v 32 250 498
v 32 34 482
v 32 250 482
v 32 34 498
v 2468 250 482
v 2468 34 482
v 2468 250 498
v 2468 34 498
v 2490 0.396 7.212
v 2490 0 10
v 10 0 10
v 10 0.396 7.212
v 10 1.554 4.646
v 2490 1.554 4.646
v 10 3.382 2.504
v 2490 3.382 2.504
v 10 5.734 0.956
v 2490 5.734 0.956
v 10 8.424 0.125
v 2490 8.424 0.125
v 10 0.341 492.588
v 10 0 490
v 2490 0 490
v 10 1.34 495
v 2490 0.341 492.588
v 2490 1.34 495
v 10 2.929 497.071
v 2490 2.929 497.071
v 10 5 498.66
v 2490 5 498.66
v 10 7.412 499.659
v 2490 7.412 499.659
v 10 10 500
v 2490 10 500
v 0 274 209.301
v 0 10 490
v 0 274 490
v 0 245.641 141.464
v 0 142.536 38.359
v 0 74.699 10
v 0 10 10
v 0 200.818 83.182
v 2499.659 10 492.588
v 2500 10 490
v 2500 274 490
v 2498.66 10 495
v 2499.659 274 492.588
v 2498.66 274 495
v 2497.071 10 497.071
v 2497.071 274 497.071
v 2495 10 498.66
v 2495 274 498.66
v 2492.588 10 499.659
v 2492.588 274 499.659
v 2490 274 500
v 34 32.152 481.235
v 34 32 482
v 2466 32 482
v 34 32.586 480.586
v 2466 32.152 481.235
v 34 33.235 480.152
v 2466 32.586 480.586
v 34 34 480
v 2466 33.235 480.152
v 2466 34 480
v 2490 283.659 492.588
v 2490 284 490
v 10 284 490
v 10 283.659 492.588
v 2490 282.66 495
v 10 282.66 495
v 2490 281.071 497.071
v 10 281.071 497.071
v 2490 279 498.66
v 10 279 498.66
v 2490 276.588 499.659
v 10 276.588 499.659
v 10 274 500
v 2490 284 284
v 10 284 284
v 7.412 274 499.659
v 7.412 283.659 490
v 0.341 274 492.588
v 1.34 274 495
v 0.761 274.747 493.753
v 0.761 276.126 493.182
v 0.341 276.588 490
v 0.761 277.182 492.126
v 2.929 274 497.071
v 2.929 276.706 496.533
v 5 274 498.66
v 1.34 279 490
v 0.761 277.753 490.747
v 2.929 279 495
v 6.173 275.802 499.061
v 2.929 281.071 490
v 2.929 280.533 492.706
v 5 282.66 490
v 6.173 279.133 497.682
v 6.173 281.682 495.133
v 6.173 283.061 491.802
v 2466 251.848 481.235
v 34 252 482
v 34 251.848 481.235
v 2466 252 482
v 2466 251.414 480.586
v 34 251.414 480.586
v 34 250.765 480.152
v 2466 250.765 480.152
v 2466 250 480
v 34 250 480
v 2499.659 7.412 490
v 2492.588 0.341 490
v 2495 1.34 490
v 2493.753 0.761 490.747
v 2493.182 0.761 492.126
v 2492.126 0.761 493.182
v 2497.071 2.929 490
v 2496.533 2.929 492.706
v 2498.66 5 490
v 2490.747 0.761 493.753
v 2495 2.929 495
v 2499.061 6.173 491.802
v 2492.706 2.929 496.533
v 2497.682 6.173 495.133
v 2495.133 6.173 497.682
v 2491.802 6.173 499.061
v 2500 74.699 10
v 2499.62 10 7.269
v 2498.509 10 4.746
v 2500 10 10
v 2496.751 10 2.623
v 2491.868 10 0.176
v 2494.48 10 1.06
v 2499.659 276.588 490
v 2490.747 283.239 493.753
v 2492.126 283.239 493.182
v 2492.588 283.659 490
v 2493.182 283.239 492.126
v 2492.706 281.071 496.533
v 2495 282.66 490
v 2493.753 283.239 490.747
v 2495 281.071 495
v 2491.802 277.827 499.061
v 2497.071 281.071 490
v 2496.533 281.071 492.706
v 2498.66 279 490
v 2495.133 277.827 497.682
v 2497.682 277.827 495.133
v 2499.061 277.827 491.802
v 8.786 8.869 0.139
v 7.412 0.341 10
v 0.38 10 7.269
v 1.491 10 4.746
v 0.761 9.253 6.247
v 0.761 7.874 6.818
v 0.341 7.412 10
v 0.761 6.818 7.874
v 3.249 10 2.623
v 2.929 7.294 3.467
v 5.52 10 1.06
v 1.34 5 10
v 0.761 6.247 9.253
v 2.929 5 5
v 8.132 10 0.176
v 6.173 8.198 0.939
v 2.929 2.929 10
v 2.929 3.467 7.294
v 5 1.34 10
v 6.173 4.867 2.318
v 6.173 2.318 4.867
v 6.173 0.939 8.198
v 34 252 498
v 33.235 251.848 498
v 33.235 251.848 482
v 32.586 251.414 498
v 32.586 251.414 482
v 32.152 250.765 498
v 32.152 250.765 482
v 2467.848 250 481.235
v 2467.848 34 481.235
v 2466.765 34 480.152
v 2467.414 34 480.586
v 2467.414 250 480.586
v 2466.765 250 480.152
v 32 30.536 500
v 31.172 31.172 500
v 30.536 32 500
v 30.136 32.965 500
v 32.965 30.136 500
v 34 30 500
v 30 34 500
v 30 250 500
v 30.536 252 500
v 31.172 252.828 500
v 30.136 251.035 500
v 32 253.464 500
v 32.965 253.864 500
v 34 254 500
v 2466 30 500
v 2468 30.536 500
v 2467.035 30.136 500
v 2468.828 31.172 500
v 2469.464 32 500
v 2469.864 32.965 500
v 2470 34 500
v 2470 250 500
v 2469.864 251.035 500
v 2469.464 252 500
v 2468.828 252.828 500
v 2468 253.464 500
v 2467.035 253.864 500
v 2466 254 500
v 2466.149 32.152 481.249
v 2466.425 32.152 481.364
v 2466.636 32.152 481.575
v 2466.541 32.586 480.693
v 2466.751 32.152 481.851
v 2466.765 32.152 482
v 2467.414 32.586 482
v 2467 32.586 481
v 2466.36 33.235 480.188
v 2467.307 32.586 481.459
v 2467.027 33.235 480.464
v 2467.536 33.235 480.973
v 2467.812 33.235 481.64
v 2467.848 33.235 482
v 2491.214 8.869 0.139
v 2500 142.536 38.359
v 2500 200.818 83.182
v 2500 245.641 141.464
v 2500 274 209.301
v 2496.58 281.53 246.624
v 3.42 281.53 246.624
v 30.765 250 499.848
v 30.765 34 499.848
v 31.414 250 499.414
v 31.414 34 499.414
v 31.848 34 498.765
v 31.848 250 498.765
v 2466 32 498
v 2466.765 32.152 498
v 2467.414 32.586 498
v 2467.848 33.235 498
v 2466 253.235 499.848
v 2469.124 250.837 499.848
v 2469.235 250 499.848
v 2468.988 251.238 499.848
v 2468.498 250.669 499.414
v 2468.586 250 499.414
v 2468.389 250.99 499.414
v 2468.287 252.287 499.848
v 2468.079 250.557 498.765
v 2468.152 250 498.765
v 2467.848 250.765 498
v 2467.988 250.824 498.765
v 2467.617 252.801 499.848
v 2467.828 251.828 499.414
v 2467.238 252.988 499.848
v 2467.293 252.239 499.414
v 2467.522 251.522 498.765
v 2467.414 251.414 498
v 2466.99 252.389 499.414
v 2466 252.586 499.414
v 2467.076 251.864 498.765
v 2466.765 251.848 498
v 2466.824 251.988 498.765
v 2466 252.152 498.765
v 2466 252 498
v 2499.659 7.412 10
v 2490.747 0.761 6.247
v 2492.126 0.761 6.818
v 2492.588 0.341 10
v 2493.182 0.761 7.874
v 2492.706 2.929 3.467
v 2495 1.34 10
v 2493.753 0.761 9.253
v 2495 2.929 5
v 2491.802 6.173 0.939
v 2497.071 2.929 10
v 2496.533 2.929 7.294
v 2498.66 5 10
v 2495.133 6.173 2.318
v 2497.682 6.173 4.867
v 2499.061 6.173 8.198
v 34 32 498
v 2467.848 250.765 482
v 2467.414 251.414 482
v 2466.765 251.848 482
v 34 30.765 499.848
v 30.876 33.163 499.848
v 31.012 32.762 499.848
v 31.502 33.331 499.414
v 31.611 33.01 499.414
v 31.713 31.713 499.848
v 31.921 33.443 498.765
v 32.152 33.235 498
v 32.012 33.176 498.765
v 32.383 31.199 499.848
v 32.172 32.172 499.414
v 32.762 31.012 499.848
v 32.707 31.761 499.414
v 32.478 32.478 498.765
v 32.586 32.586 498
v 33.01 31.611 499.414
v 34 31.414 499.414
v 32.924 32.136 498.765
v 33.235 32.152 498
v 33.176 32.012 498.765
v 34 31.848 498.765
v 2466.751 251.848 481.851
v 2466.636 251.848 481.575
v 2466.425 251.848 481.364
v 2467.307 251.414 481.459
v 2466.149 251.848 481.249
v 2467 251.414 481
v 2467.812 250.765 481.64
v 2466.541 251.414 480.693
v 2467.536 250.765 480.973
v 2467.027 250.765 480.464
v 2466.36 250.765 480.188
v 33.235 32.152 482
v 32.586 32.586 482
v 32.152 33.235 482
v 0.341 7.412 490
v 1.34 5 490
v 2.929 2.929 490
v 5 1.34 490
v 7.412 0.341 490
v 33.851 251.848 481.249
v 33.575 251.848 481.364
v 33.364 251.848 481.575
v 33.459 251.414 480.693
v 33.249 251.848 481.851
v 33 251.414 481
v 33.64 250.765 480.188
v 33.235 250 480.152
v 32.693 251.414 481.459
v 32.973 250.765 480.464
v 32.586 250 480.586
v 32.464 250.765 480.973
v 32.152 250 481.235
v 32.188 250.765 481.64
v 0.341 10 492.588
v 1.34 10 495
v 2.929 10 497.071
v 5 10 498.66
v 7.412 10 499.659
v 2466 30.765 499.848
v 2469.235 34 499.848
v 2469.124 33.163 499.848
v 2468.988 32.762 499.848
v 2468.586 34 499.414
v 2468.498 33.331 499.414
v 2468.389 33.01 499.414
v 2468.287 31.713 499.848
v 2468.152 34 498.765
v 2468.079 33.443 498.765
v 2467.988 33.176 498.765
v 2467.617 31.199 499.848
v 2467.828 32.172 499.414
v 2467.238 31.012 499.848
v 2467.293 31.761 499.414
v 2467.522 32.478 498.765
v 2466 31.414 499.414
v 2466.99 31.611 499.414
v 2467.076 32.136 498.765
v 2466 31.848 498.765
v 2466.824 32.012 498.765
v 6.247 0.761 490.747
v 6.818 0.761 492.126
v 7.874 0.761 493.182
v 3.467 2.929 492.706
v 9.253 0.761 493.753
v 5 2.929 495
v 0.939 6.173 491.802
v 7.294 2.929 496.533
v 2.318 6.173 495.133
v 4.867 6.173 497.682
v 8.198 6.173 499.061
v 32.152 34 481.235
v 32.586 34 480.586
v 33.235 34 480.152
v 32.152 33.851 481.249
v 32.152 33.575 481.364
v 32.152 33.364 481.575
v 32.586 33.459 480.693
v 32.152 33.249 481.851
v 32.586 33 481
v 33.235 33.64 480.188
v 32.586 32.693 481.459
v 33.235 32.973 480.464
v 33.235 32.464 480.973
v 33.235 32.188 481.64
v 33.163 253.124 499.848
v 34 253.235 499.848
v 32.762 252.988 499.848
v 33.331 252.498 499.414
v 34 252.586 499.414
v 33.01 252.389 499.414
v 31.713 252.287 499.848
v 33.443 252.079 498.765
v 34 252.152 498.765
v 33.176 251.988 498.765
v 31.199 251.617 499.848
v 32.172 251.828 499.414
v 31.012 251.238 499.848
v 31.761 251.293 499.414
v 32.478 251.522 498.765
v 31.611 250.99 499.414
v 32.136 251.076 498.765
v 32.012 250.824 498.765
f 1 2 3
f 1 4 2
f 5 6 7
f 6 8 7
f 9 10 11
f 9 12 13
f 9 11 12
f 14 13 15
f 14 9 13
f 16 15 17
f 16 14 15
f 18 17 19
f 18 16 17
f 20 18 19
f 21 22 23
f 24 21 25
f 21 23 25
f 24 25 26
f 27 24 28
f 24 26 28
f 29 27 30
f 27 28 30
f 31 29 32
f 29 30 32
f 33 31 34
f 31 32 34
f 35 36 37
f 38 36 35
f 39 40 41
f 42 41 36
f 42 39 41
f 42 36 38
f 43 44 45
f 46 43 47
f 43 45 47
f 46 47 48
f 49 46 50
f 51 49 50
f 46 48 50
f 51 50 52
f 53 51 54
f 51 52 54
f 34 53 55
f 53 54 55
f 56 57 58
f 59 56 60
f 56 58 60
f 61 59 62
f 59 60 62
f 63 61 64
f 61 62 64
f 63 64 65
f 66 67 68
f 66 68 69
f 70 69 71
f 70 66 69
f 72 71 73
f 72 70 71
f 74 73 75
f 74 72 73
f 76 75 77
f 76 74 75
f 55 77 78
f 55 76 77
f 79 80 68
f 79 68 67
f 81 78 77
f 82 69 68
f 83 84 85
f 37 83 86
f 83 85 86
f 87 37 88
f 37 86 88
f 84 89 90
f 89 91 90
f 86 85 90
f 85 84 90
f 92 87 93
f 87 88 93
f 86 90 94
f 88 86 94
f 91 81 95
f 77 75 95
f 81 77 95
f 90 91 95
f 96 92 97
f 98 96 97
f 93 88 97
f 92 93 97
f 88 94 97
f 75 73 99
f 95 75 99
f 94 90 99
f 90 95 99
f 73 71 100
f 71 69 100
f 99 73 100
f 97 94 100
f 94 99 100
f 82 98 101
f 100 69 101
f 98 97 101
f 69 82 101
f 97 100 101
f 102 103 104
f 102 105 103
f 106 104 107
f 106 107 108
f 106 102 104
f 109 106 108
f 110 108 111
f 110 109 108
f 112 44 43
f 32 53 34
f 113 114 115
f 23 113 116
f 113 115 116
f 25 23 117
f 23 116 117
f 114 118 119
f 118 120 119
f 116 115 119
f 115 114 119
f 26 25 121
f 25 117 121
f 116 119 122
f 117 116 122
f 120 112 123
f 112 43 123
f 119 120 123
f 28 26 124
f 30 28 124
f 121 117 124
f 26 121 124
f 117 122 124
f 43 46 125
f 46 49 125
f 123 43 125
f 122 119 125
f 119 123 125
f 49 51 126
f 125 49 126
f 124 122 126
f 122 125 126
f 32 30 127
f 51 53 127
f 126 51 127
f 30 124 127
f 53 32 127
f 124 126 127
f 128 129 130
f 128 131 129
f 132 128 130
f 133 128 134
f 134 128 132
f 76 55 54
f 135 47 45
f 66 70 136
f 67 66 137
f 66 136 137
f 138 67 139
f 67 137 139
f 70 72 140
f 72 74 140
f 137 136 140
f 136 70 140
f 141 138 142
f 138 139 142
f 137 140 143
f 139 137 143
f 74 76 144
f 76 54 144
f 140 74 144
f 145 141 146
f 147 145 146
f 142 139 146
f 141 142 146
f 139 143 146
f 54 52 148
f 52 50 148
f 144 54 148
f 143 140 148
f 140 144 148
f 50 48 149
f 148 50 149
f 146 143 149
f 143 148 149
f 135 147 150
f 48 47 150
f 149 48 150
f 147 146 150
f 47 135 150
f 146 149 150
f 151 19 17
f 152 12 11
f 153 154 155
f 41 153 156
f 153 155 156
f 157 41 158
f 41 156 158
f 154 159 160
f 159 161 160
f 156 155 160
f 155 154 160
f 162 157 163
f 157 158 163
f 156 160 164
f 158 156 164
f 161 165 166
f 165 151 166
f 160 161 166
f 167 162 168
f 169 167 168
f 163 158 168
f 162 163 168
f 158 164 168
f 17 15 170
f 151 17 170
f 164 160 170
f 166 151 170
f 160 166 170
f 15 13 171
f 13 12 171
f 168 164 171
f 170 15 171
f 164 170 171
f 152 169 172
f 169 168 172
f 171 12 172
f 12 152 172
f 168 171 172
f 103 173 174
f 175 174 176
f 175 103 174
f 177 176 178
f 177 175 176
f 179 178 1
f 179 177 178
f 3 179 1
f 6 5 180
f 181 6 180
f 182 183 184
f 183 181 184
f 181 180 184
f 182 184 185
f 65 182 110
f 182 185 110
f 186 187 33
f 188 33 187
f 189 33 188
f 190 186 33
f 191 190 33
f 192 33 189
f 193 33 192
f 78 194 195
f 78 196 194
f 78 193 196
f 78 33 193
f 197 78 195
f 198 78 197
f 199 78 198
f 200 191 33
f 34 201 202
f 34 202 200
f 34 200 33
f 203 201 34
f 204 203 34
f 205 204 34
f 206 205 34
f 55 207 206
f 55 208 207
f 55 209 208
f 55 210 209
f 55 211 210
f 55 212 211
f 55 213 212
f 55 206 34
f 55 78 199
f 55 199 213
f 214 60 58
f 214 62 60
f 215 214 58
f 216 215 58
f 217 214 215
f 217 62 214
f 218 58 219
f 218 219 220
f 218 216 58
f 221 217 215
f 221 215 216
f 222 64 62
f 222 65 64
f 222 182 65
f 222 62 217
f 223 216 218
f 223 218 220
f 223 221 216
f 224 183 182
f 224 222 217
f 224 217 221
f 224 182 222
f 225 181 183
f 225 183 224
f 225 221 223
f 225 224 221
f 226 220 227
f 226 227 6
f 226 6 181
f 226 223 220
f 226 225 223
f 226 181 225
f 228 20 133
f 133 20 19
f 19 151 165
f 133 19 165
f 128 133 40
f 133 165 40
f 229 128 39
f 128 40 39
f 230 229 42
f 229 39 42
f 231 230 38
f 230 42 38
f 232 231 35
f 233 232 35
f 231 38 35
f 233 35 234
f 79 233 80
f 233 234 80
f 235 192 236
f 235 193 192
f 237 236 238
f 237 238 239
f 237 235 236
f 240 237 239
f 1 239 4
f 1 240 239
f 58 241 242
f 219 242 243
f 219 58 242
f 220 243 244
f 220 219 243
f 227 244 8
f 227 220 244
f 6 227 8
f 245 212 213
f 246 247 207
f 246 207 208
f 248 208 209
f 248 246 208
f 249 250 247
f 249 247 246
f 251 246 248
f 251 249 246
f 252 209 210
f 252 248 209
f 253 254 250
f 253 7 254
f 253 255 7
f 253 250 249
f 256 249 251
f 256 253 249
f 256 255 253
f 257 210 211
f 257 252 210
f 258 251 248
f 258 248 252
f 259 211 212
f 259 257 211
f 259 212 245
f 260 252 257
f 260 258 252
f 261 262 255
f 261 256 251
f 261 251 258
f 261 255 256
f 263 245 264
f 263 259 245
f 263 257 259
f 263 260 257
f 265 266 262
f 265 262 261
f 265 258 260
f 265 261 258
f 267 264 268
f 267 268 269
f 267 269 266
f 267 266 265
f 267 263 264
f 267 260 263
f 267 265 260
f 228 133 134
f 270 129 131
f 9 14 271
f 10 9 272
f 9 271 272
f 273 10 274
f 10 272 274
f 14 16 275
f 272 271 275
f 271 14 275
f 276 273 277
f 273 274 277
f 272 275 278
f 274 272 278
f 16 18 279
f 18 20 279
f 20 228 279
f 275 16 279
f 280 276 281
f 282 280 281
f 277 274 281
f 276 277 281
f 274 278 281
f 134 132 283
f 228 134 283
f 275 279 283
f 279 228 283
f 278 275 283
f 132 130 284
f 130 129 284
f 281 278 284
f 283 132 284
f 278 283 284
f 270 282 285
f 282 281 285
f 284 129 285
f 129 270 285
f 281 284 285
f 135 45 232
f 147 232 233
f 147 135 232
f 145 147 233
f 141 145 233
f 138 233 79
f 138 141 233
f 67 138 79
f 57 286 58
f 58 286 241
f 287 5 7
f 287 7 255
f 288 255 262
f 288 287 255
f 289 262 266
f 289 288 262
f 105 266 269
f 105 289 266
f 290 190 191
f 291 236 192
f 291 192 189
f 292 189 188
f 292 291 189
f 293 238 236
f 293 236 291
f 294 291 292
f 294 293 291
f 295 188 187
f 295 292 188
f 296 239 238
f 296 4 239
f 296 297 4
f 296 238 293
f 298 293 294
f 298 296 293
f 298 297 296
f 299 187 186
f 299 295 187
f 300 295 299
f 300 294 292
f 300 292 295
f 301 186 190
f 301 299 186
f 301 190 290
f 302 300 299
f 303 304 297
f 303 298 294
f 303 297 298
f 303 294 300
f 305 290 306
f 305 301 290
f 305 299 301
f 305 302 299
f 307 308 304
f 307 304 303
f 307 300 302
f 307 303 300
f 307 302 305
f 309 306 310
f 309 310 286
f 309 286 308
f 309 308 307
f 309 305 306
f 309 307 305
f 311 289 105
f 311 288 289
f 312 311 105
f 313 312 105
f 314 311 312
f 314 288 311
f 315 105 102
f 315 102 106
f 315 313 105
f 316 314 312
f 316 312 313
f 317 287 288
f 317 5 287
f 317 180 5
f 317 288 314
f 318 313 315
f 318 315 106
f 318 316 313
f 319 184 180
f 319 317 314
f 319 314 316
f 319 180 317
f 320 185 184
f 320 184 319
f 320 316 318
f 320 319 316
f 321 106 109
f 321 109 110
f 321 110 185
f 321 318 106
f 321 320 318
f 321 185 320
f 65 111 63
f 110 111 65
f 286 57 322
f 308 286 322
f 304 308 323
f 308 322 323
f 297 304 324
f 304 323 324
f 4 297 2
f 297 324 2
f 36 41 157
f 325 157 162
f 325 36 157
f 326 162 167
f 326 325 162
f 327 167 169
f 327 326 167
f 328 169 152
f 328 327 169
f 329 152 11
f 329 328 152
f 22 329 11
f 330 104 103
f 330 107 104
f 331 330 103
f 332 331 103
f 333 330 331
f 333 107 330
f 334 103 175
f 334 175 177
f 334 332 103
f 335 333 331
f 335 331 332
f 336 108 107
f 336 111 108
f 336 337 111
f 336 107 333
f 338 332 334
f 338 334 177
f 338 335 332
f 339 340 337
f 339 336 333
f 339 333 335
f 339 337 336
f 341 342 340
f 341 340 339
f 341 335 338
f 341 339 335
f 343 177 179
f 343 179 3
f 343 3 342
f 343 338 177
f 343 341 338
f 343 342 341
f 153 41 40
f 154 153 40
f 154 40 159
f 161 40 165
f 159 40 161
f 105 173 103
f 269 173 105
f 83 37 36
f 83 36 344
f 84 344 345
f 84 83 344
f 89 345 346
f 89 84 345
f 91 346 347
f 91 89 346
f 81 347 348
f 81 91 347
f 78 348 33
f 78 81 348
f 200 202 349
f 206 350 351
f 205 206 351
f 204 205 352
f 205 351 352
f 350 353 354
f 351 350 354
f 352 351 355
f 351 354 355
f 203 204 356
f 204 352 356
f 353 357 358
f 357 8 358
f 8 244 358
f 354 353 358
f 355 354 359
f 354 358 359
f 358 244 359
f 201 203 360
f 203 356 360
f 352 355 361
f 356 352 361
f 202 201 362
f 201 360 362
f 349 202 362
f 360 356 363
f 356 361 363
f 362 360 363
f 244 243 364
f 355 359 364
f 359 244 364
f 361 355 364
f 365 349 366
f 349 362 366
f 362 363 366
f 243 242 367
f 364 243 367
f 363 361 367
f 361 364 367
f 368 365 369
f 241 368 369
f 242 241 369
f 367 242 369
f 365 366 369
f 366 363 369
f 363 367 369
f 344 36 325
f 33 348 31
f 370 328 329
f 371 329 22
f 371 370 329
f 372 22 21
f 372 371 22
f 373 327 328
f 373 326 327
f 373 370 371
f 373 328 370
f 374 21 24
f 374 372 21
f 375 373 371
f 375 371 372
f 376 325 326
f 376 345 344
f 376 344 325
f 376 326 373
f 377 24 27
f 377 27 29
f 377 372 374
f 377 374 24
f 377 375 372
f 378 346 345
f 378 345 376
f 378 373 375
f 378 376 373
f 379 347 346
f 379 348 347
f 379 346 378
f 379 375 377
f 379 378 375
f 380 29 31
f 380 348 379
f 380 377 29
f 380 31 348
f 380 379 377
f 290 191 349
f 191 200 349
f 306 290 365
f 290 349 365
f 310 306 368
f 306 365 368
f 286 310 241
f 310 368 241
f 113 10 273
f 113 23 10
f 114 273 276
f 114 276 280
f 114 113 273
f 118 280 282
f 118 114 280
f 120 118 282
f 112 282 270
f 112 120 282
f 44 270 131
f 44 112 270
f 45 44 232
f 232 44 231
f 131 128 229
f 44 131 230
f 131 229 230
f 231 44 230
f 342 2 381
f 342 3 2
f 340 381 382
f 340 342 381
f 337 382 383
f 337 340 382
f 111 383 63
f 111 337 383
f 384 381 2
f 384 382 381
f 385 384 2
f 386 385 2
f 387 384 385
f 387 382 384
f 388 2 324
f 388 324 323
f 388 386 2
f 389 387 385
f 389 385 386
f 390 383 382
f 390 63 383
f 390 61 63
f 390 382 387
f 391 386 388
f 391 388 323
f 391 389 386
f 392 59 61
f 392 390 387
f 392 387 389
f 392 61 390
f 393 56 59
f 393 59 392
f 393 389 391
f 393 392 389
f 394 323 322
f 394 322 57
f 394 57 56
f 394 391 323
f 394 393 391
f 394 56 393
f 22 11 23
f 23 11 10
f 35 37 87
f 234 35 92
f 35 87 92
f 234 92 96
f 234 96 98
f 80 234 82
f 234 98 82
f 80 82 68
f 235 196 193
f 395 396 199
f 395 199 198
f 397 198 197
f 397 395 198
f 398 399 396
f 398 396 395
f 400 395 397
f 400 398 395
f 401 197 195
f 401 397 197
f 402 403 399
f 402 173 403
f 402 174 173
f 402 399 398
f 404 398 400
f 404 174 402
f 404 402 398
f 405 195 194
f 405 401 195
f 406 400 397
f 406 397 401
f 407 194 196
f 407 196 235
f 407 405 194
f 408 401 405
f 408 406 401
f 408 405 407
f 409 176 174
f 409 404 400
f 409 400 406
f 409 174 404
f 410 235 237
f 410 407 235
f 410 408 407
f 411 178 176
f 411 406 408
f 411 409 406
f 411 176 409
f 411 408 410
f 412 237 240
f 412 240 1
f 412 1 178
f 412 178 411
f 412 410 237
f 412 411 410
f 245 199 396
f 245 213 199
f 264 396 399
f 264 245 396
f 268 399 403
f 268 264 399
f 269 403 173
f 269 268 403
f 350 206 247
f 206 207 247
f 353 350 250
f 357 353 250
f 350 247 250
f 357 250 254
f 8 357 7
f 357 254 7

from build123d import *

# Parameters (mm, degrees)
SKETCH1_W           = 2500
SKETCH1_H           = 284
BOSS_EXTRUDE1_DEPTH = 500
FILLET1_R           = 10
SKETCH2_W           = 2436
SKETCH2_H           = 220
CUT_EXTRUDE1_DEPTH  = 20
FILLET2_R           = 2
CUT_EXTRUDE2_REACH  = 2567.279


with BuildPart() as part:
    # Sketch1 → Boss-Extrude1 (new body)
    with BuildSketch(Plane.XY):
        with Locations((1250, 142)):
            Rectangle(SKETCH1_W, SKETCH1_H)
    extrude(amount=BOSS_EXTRUDE1_DEPTH)

    # Fillet1
    fillet1_edges = [part.edges().sort_by_distance(p)[0] for p in [
        (2500, 142, 500),
        (1250, 284, 500),
        (0, 142, 500),
        (1250, 284, 0),
        (2500, 142, 0),
        (1250, 0, 0),
        (0, 142, 0),
        (0, 284, 250),
        (2500, 284, 250),
        (2500, 0, 250),
        (0, 0, 250),
        (1250, 0, 500),
    ]]
    fillet(fillet1_edges, radius=FILLET1_R)

    # Sketch2 → Cut-Extrude1 (cut)
    with BuildSketch(Plane.XY.offset(500)):
        with Locations((1250, 142)):
            Rectangle(SKETCH2_W, SKETCH2_H)
    extrude(amount=-CUT_EXTRUDE1_DEPTH, mode=Mode.SUBTRACT)

    # Fillet2
    fillet2_edges = [part.edges().sort_by_distance(p)[0] for p in [
        (2468, 142, 480),
        (2468, 252, 490),
        (1250, 32, 480),
        (2468, 32, 490),
        (32, 142, 480),
        (32, 32, 490),
        (1250, 252, 480),
        (32, 252, 490),
        (2468, 142, 500),
        (1250, 252, 500),
        (32, 142, 500),
        (1250, 32, 500),
    ]]
    fillet(fillet2_edges, radius=FILLET2_R)

    # Cut-Extrude2: up to this face of the body (flat: up to its plane)
    cut_extrude2_end = Plane(part.part.faces().sort_by_distance((2500, 142, 250))[0])
    # Sketch3 → Cut-Extrude2 (cut, up to the picked face)
    with BuildSketch(Plane.ZY, mode=Mode.PRIVATE) as cut_extrude2_sk1:
        with BuildLine():
            Line((284, 284), (0, 284))
            Line((0, 284), (0, 0))
            ThreePointArc((0, 0), (83.181674143, 200.818325857), (284, 284))
        make_face()
    cut_extrude2_tool1 = split(extrude(cut_extrude2_sk1.sketch, amount=-CUT_EXTRUDE2_REACH, mode=Mode.PRIVATE), bisect_by=cut_extrude2_end, keep=Keep.BOTH, mode=Mode.PRIVATE)
    add(cut_extrude2_tool1.solids().sort_by(Axis((0, 220.563505, 63.436495), (1, 0, 0)))[0], mode=Mode.SUBTRACT)


solid = part.part
